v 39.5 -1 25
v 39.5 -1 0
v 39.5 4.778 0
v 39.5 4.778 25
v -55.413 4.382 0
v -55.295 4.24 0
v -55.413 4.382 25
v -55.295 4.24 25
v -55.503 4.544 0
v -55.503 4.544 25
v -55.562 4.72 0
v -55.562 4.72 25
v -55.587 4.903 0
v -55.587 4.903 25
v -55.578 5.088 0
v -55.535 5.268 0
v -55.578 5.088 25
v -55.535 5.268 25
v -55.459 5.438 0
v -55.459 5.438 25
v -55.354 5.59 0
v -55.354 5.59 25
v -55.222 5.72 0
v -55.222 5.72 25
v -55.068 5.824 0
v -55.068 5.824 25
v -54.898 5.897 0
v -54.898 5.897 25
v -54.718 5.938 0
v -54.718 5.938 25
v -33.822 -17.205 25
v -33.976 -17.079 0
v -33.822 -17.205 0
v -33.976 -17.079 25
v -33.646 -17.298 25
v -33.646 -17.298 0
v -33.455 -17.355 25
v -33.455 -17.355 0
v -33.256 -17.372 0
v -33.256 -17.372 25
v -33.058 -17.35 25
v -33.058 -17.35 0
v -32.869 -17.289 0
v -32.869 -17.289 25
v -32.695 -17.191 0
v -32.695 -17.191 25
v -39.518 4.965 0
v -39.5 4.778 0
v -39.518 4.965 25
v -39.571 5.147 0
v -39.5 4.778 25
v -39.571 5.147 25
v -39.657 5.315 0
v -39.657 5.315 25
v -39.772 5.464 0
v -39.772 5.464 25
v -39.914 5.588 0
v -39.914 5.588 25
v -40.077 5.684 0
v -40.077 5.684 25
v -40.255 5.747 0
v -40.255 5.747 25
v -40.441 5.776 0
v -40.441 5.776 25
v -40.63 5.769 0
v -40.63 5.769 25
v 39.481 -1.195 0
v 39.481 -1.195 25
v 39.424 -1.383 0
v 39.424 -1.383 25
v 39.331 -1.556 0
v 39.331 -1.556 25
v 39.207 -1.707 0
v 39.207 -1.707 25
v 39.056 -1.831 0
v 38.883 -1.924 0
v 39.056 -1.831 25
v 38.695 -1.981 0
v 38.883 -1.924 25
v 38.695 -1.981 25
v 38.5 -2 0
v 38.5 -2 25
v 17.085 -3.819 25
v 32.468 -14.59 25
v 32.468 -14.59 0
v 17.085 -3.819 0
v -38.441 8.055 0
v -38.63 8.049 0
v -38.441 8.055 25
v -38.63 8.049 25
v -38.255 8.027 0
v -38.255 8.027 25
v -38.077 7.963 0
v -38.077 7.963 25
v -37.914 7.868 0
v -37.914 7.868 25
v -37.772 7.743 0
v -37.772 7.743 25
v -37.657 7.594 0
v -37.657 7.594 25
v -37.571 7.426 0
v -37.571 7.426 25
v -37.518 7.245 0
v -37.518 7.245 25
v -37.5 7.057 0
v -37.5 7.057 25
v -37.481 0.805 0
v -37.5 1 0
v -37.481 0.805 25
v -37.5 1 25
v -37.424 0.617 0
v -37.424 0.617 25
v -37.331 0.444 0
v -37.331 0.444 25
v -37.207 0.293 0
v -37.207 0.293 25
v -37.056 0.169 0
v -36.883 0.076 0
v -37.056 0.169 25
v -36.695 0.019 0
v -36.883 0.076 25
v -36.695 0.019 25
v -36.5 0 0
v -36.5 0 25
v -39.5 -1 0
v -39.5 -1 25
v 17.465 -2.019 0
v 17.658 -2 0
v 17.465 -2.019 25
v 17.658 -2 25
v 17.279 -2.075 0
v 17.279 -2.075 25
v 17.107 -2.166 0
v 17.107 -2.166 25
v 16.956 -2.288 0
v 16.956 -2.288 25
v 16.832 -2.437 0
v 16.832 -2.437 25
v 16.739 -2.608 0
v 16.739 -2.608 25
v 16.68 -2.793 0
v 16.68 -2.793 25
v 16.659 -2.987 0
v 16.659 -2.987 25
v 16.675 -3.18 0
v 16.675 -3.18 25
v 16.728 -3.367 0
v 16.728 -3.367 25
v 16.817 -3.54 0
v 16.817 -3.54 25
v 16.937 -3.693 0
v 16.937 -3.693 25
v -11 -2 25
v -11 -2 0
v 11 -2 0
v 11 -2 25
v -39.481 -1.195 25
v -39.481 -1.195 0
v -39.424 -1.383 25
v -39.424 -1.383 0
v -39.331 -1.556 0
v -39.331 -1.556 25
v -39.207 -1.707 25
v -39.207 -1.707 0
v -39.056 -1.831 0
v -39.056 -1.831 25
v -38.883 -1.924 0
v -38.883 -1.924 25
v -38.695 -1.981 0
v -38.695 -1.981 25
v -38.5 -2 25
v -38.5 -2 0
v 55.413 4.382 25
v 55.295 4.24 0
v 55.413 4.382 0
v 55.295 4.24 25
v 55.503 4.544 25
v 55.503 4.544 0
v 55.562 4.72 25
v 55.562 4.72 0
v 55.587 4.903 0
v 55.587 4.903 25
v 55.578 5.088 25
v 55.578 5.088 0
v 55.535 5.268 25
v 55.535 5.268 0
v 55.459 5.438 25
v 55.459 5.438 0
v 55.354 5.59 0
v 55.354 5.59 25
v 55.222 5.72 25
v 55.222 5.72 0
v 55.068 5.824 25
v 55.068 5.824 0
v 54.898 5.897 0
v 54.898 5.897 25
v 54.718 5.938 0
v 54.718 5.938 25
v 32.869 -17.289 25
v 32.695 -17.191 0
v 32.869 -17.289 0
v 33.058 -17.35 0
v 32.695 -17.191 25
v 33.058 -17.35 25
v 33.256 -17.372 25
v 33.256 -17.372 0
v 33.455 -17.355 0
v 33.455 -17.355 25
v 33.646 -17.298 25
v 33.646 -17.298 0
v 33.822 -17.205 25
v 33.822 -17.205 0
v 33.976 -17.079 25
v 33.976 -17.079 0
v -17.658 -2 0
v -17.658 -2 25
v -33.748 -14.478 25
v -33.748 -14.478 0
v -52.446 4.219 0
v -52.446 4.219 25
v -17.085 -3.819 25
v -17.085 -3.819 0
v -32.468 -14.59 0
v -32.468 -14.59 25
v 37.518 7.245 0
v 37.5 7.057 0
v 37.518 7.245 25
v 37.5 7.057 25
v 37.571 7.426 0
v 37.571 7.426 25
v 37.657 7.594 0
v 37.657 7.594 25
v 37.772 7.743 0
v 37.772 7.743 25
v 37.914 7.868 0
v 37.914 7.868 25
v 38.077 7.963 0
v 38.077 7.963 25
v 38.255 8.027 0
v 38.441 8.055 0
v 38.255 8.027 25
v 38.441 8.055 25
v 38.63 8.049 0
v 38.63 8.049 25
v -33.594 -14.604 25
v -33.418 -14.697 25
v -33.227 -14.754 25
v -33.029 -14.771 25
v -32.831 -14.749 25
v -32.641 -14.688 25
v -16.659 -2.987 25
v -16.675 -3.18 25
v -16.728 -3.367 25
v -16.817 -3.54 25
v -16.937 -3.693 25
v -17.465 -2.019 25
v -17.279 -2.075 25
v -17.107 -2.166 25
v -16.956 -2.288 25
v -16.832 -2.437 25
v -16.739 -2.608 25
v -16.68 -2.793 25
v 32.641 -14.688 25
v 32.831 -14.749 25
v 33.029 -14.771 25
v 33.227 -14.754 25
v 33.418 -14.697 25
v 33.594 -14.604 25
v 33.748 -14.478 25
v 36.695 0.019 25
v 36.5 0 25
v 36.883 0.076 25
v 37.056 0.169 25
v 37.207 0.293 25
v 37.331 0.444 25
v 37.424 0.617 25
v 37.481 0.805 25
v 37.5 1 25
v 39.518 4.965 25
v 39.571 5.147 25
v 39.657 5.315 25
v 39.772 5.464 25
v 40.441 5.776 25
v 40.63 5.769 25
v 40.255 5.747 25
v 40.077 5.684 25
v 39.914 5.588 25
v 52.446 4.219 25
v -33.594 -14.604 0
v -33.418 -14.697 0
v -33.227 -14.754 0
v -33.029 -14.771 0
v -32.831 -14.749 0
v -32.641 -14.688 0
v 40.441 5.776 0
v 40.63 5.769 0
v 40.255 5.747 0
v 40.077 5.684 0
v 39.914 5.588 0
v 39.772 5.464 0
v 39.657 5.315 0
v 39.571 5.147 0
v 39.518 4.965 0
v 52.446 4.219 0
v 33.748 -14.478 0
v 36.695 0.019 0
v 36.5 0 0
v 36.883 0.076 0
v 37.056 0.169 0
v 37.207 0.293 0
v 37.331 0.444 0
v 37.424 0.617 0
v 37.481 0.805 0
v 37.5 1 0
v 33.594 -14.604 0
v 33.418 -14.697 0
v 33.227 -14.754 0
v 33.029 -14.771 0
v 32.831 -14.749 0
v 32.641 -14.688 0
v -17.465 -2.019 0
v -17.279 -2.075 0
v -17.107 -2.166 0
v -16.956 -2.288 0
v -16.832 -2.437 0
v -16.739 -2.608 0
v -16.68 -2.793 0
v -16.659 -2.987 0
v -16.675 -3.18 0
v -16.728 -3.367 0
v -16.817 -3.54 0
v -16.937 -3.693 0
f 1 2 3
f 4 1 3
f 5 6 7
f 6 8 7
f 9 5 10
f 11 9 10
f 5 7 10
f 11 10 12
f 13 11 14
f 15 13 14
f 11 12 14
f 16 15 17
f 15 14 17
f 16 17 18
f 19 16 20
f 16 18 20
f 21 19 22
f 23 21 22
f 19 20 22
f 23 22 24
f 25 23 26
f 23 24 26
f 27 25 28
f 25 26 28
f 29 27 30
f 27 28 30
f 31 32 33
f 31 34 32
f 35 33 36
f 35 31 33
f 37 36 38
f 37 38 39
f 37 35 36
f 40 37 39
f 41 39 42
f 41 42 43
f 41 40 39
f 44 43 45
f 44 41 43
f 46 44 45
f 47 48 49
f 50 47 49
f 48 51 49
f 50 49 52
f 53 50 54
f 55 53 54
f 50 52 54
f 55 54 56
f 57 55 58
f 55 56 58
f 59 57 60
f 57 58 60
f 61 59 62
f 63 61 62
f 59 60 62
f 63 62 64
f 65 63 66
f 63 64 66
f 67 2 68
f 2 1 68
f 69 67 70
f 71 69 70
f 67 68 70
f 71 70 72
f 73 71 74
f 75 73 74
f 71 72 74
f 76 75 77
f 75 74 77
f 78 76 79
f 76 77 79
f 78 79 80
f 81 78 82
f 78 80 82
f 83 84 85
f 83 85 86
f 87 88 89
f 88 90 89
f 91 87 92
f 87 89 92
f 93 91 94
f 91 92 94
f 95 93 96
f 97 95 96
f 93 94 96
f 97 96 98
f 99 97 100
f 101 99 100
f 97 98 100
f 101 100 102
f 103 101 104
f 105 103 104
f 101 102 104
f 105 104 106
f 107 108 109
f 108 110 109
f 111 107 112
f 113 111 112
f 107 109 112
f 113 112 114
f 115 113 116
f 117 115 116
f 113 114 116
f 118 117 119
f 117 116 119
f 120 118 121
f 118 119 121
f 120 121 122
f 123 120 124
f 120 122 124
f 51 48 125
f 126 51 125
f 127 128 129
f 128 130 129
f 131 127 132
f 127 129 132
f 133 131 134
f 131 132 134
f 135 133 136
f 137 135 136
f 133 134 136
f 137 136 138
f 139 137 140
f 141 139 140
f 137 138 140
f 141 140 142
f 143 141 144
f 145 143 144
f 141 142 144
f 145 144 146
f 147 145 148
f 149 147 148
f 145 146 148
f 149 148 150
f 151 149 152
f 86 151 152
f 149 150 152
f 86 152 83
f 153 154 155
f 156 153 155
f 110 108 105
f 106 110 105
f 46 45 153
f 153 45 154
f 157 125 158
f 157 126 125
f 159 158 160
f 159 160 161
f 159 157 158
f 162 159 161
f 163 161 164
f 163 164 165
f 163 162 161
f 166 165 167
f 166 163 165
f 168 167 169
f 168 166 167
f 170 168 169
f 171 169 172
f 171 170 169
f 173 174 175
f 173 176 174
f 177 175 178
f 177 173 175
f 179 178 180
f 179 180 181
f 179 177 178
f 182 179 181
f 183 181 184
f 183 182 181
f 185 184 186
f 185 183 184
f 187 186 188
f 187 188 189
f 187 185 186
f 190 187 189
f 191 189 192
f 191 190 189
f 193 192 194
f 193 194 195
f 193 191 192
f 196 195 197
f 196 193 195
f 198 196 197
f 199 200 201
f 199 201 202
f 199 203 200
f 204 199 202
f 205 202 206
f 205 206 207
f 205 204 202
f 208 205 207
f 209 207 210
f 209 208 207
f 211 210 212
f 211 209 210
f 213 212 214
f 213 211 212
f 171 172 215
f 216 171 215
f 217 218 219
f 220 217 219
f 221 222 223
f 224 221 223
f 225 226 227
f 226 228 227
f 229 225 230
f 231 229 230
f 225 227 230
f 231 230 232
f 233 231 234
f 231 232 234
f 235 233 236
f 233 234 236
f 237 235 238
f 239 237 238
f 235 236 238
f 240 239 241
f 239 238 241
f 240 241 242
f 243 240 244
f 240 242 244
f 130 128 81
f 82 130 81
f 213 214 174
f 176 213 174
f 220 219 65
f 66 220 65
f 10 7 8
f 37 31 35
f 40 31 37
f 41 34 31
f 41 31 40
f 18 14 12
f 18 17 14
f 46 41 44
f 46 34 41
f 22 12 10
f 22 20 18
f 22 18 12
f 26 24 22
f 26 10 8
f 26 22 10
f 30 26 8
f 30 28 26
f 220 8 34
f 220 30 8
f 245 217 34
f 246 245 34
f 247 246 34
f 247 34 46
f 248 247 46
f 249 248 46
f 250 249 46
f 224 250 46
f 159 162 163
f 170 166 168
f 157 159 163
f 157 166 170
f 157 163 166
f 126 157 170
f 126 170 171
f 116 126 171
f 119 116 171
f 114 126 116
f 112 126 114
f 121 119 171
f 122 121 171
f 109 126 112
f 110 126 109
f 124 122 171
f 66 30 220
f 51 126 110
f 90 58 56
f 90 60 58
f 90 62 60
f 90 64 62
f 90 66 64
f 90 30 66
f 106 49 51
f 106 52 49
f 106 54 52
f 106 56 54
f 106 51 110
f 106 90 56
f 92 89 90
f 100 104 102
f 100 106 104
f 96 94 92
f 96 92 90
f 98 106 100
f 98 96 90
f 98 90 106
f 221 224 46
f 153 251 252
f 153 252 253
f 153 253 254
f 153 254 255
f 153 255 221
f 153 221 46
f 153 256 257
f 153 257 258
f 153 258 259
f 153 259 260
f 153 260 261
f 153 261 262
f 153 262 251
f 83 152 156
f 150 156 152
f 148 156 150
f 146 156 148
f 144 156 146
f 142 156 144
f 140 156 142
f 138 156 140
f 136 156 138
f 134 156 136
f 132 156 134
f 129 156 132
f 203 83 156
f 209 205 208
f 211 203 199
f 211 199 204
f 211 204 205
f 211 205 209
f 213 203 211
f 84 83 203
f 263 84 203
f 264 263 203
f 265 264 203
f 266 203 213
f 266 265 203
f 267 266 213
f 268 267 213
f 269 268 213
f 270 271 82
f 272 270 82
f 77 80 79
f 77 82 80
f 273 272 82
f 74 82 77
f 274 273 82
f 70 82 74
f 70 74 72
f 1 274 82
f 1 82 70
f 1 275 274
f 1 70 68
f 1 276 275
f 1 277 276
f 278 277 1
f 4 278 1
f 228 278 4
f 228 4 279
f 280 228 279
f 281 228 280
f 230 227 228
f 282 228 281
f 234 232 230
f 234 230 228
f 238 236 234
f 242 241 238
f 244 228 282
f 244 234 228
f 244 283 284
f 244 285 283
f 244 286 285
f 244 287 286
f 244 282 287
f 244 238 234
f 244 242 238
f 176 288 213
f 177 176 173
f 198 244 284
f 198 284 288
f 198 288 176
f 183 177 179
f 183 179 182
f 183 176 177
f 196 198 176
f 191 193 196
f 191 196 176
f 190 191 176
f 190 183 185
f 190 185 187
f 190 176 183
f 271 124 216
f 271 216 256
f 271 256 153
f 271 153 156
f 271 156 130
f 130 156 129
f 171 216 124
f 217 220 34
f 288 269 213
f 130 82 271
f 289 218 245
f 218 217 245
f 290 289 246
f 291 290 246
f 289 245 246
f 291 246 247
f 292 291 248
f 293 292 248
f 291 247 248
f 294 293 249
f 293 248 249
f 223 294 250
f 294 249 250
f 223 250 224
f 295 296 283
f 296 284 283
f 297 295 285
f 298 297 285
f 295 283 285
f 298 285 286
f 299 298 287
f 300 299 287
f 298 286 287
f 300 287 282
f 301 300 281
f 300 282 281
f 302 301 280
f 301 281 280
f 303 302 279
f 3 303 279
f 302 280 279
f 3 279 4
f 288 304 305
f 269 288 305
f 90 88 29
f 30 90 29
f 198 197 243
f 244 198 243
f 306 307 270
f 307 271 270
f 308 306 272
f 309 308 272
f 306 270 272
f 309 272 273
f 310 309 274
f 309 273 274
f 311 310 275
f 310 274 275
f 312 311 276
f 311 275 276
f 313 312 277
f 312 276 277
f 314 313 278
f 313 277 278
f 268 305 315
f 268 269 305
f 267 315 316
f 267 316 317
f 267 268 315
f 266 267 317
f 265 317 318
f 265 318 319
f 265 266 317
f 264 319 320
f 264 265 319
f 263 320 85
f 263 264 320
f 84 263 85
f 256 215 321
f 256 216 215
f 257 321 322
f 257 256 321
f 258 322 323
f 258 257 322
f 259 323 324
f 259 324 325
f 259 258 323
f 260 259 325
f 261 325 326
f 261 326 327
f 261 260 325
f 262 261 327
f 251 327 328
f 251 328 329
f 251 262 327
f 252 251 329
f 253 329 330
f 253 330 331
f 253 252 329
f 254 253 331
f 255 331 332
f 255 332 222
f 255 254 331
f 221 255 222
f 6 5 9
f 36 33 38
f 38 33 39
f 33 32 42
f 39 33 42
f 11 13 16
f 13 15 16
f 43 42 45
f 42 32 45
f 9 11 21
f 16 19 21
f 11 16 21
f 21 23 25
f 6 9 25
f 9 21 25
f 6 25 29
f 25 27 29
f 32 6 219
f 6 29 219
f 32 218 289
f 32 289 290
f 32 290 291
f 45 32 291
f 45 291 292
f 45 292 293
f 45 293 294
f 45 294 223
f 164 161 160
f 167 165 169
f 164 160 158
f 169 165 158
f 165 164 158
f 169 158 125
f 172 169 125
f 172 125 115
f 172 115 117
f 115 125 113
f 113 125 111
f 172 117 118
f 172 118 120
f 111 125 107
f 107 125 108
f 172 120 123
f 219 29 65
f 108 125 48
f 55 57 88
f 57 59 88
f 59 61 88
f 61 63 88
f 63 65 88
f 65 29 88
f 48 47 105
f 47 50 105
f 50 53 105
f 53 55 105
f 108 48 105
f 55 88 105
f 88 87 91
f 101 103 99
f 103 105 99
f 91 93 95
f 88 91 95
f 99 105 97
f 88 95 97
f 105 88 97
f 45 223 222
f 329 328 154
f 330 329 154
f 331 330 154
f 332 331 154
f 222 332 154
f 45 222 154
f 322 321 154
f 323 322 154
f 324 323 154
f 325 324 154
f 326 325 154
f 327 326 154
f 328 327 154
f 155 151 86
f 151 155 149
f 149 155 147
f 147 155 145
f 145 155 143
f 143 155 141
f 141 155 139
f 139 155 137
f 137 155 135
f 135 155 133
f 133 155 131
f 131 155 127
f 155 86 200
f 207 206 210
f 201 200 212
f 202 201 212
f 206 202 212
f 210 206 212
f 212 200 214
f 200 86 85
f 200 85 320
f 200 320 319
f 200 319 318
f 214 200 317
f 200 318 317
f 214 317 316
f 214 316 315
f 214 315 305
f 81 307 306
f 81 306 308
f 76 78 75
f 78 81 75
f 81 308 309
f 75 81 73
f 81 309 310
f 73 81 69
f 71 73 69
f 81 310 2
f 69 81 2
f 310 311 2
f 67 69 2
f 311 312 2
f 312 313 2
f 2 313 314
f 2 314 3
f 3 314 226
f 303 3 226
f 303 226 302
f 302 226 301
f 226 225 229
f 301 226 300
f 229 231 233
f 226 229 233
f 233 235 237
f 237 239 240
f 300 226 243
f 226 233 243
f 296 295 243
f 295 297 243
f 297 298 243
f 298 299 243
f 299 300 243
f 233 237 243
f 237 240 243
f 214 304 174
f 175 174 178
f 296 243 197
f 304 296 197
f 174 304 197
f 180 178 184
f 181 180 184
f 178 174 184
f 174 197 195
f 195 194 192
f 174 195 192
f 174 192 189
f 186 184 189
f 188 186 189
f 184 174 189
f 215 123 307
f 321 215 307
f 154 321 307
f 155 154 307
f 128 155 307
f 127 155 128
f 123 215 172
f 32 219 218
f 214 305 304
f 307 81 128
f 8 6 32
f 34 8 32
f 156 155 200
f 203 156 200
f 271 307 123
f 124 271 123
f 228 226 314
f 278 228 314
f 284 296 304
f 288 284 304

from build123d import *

# Parameters (mm, degrees)
F1_DEPTH = 25
F2_R     = 1


# Not quite as in the source:
# - a feature names something its author has since deleted; it is built from what else it names


with BuildPart() as f1:
    # F0 (on Top) → F1 (new body)
    with BuildSketch(Plane.XY):
        Polygon((0, -2), (0, 0), (-37.5, 0), (-37.5, 8.1967763358), (-56.72952592, 5.6744525365), (-33.382604787, -17.6724685966), (-11, -2), align=None)
        Polygon((-39.5, -2), (-14.4868935912, -2), (-33.1550573032, -15.0715889556), (-52.4458532095, 4.2192069507), (-39.5, 5.9173056865), align=None, mode=Mode.SUBTRACT)
        Polygon((37.5, 0), (0, 0), (0, -2), (11, -2), (33.382604787, -17.6724685966), (56.72952592, 5.6744525365), (37.5, 8.1967763358), align=None)
        Polygon((33.1550573032, -15.0715889556), (14.4868935912, -2), (39.5, -2), (39.5, 5.9173056865), (52.4458532095, 4.2192069507), align=None, mode=Mode.SUBTRACT)
    extrude(amount=F1_DEPTH)

    # F2
    f2_edges = [f1.edges().sort_by_distance(p)[0] for p in [
        (-37.5, 8.196776, 12.5),
        (-56.729526, 5.674453, 12.5),
        (-33.382605, -17.672469, 12.5),
        (-37.5, 0, 12.5),
        (-39.5, -2, 12.5),
        (37.5, 0, 12.5),
        (37.5, 8.196776, 12.5),
        (56.729526, 5.674453, 12.5),
        (39.5, -2, 12.5),
        (33.382605, -17.672469, 12.5),
        (14.486894, -2, 12.5),
        (-14.486894, -2, 12.5),
        (-39.5, 5.917306, 12.5),
        (-33.155057, -15.071589, 12.5),
        (39.5, 5.917306, 12.5),
        (33.155057, -15.071589, 12.5),
    ]]
    fillet(f2_edges, radius=F2_R)


solid = f1.part
